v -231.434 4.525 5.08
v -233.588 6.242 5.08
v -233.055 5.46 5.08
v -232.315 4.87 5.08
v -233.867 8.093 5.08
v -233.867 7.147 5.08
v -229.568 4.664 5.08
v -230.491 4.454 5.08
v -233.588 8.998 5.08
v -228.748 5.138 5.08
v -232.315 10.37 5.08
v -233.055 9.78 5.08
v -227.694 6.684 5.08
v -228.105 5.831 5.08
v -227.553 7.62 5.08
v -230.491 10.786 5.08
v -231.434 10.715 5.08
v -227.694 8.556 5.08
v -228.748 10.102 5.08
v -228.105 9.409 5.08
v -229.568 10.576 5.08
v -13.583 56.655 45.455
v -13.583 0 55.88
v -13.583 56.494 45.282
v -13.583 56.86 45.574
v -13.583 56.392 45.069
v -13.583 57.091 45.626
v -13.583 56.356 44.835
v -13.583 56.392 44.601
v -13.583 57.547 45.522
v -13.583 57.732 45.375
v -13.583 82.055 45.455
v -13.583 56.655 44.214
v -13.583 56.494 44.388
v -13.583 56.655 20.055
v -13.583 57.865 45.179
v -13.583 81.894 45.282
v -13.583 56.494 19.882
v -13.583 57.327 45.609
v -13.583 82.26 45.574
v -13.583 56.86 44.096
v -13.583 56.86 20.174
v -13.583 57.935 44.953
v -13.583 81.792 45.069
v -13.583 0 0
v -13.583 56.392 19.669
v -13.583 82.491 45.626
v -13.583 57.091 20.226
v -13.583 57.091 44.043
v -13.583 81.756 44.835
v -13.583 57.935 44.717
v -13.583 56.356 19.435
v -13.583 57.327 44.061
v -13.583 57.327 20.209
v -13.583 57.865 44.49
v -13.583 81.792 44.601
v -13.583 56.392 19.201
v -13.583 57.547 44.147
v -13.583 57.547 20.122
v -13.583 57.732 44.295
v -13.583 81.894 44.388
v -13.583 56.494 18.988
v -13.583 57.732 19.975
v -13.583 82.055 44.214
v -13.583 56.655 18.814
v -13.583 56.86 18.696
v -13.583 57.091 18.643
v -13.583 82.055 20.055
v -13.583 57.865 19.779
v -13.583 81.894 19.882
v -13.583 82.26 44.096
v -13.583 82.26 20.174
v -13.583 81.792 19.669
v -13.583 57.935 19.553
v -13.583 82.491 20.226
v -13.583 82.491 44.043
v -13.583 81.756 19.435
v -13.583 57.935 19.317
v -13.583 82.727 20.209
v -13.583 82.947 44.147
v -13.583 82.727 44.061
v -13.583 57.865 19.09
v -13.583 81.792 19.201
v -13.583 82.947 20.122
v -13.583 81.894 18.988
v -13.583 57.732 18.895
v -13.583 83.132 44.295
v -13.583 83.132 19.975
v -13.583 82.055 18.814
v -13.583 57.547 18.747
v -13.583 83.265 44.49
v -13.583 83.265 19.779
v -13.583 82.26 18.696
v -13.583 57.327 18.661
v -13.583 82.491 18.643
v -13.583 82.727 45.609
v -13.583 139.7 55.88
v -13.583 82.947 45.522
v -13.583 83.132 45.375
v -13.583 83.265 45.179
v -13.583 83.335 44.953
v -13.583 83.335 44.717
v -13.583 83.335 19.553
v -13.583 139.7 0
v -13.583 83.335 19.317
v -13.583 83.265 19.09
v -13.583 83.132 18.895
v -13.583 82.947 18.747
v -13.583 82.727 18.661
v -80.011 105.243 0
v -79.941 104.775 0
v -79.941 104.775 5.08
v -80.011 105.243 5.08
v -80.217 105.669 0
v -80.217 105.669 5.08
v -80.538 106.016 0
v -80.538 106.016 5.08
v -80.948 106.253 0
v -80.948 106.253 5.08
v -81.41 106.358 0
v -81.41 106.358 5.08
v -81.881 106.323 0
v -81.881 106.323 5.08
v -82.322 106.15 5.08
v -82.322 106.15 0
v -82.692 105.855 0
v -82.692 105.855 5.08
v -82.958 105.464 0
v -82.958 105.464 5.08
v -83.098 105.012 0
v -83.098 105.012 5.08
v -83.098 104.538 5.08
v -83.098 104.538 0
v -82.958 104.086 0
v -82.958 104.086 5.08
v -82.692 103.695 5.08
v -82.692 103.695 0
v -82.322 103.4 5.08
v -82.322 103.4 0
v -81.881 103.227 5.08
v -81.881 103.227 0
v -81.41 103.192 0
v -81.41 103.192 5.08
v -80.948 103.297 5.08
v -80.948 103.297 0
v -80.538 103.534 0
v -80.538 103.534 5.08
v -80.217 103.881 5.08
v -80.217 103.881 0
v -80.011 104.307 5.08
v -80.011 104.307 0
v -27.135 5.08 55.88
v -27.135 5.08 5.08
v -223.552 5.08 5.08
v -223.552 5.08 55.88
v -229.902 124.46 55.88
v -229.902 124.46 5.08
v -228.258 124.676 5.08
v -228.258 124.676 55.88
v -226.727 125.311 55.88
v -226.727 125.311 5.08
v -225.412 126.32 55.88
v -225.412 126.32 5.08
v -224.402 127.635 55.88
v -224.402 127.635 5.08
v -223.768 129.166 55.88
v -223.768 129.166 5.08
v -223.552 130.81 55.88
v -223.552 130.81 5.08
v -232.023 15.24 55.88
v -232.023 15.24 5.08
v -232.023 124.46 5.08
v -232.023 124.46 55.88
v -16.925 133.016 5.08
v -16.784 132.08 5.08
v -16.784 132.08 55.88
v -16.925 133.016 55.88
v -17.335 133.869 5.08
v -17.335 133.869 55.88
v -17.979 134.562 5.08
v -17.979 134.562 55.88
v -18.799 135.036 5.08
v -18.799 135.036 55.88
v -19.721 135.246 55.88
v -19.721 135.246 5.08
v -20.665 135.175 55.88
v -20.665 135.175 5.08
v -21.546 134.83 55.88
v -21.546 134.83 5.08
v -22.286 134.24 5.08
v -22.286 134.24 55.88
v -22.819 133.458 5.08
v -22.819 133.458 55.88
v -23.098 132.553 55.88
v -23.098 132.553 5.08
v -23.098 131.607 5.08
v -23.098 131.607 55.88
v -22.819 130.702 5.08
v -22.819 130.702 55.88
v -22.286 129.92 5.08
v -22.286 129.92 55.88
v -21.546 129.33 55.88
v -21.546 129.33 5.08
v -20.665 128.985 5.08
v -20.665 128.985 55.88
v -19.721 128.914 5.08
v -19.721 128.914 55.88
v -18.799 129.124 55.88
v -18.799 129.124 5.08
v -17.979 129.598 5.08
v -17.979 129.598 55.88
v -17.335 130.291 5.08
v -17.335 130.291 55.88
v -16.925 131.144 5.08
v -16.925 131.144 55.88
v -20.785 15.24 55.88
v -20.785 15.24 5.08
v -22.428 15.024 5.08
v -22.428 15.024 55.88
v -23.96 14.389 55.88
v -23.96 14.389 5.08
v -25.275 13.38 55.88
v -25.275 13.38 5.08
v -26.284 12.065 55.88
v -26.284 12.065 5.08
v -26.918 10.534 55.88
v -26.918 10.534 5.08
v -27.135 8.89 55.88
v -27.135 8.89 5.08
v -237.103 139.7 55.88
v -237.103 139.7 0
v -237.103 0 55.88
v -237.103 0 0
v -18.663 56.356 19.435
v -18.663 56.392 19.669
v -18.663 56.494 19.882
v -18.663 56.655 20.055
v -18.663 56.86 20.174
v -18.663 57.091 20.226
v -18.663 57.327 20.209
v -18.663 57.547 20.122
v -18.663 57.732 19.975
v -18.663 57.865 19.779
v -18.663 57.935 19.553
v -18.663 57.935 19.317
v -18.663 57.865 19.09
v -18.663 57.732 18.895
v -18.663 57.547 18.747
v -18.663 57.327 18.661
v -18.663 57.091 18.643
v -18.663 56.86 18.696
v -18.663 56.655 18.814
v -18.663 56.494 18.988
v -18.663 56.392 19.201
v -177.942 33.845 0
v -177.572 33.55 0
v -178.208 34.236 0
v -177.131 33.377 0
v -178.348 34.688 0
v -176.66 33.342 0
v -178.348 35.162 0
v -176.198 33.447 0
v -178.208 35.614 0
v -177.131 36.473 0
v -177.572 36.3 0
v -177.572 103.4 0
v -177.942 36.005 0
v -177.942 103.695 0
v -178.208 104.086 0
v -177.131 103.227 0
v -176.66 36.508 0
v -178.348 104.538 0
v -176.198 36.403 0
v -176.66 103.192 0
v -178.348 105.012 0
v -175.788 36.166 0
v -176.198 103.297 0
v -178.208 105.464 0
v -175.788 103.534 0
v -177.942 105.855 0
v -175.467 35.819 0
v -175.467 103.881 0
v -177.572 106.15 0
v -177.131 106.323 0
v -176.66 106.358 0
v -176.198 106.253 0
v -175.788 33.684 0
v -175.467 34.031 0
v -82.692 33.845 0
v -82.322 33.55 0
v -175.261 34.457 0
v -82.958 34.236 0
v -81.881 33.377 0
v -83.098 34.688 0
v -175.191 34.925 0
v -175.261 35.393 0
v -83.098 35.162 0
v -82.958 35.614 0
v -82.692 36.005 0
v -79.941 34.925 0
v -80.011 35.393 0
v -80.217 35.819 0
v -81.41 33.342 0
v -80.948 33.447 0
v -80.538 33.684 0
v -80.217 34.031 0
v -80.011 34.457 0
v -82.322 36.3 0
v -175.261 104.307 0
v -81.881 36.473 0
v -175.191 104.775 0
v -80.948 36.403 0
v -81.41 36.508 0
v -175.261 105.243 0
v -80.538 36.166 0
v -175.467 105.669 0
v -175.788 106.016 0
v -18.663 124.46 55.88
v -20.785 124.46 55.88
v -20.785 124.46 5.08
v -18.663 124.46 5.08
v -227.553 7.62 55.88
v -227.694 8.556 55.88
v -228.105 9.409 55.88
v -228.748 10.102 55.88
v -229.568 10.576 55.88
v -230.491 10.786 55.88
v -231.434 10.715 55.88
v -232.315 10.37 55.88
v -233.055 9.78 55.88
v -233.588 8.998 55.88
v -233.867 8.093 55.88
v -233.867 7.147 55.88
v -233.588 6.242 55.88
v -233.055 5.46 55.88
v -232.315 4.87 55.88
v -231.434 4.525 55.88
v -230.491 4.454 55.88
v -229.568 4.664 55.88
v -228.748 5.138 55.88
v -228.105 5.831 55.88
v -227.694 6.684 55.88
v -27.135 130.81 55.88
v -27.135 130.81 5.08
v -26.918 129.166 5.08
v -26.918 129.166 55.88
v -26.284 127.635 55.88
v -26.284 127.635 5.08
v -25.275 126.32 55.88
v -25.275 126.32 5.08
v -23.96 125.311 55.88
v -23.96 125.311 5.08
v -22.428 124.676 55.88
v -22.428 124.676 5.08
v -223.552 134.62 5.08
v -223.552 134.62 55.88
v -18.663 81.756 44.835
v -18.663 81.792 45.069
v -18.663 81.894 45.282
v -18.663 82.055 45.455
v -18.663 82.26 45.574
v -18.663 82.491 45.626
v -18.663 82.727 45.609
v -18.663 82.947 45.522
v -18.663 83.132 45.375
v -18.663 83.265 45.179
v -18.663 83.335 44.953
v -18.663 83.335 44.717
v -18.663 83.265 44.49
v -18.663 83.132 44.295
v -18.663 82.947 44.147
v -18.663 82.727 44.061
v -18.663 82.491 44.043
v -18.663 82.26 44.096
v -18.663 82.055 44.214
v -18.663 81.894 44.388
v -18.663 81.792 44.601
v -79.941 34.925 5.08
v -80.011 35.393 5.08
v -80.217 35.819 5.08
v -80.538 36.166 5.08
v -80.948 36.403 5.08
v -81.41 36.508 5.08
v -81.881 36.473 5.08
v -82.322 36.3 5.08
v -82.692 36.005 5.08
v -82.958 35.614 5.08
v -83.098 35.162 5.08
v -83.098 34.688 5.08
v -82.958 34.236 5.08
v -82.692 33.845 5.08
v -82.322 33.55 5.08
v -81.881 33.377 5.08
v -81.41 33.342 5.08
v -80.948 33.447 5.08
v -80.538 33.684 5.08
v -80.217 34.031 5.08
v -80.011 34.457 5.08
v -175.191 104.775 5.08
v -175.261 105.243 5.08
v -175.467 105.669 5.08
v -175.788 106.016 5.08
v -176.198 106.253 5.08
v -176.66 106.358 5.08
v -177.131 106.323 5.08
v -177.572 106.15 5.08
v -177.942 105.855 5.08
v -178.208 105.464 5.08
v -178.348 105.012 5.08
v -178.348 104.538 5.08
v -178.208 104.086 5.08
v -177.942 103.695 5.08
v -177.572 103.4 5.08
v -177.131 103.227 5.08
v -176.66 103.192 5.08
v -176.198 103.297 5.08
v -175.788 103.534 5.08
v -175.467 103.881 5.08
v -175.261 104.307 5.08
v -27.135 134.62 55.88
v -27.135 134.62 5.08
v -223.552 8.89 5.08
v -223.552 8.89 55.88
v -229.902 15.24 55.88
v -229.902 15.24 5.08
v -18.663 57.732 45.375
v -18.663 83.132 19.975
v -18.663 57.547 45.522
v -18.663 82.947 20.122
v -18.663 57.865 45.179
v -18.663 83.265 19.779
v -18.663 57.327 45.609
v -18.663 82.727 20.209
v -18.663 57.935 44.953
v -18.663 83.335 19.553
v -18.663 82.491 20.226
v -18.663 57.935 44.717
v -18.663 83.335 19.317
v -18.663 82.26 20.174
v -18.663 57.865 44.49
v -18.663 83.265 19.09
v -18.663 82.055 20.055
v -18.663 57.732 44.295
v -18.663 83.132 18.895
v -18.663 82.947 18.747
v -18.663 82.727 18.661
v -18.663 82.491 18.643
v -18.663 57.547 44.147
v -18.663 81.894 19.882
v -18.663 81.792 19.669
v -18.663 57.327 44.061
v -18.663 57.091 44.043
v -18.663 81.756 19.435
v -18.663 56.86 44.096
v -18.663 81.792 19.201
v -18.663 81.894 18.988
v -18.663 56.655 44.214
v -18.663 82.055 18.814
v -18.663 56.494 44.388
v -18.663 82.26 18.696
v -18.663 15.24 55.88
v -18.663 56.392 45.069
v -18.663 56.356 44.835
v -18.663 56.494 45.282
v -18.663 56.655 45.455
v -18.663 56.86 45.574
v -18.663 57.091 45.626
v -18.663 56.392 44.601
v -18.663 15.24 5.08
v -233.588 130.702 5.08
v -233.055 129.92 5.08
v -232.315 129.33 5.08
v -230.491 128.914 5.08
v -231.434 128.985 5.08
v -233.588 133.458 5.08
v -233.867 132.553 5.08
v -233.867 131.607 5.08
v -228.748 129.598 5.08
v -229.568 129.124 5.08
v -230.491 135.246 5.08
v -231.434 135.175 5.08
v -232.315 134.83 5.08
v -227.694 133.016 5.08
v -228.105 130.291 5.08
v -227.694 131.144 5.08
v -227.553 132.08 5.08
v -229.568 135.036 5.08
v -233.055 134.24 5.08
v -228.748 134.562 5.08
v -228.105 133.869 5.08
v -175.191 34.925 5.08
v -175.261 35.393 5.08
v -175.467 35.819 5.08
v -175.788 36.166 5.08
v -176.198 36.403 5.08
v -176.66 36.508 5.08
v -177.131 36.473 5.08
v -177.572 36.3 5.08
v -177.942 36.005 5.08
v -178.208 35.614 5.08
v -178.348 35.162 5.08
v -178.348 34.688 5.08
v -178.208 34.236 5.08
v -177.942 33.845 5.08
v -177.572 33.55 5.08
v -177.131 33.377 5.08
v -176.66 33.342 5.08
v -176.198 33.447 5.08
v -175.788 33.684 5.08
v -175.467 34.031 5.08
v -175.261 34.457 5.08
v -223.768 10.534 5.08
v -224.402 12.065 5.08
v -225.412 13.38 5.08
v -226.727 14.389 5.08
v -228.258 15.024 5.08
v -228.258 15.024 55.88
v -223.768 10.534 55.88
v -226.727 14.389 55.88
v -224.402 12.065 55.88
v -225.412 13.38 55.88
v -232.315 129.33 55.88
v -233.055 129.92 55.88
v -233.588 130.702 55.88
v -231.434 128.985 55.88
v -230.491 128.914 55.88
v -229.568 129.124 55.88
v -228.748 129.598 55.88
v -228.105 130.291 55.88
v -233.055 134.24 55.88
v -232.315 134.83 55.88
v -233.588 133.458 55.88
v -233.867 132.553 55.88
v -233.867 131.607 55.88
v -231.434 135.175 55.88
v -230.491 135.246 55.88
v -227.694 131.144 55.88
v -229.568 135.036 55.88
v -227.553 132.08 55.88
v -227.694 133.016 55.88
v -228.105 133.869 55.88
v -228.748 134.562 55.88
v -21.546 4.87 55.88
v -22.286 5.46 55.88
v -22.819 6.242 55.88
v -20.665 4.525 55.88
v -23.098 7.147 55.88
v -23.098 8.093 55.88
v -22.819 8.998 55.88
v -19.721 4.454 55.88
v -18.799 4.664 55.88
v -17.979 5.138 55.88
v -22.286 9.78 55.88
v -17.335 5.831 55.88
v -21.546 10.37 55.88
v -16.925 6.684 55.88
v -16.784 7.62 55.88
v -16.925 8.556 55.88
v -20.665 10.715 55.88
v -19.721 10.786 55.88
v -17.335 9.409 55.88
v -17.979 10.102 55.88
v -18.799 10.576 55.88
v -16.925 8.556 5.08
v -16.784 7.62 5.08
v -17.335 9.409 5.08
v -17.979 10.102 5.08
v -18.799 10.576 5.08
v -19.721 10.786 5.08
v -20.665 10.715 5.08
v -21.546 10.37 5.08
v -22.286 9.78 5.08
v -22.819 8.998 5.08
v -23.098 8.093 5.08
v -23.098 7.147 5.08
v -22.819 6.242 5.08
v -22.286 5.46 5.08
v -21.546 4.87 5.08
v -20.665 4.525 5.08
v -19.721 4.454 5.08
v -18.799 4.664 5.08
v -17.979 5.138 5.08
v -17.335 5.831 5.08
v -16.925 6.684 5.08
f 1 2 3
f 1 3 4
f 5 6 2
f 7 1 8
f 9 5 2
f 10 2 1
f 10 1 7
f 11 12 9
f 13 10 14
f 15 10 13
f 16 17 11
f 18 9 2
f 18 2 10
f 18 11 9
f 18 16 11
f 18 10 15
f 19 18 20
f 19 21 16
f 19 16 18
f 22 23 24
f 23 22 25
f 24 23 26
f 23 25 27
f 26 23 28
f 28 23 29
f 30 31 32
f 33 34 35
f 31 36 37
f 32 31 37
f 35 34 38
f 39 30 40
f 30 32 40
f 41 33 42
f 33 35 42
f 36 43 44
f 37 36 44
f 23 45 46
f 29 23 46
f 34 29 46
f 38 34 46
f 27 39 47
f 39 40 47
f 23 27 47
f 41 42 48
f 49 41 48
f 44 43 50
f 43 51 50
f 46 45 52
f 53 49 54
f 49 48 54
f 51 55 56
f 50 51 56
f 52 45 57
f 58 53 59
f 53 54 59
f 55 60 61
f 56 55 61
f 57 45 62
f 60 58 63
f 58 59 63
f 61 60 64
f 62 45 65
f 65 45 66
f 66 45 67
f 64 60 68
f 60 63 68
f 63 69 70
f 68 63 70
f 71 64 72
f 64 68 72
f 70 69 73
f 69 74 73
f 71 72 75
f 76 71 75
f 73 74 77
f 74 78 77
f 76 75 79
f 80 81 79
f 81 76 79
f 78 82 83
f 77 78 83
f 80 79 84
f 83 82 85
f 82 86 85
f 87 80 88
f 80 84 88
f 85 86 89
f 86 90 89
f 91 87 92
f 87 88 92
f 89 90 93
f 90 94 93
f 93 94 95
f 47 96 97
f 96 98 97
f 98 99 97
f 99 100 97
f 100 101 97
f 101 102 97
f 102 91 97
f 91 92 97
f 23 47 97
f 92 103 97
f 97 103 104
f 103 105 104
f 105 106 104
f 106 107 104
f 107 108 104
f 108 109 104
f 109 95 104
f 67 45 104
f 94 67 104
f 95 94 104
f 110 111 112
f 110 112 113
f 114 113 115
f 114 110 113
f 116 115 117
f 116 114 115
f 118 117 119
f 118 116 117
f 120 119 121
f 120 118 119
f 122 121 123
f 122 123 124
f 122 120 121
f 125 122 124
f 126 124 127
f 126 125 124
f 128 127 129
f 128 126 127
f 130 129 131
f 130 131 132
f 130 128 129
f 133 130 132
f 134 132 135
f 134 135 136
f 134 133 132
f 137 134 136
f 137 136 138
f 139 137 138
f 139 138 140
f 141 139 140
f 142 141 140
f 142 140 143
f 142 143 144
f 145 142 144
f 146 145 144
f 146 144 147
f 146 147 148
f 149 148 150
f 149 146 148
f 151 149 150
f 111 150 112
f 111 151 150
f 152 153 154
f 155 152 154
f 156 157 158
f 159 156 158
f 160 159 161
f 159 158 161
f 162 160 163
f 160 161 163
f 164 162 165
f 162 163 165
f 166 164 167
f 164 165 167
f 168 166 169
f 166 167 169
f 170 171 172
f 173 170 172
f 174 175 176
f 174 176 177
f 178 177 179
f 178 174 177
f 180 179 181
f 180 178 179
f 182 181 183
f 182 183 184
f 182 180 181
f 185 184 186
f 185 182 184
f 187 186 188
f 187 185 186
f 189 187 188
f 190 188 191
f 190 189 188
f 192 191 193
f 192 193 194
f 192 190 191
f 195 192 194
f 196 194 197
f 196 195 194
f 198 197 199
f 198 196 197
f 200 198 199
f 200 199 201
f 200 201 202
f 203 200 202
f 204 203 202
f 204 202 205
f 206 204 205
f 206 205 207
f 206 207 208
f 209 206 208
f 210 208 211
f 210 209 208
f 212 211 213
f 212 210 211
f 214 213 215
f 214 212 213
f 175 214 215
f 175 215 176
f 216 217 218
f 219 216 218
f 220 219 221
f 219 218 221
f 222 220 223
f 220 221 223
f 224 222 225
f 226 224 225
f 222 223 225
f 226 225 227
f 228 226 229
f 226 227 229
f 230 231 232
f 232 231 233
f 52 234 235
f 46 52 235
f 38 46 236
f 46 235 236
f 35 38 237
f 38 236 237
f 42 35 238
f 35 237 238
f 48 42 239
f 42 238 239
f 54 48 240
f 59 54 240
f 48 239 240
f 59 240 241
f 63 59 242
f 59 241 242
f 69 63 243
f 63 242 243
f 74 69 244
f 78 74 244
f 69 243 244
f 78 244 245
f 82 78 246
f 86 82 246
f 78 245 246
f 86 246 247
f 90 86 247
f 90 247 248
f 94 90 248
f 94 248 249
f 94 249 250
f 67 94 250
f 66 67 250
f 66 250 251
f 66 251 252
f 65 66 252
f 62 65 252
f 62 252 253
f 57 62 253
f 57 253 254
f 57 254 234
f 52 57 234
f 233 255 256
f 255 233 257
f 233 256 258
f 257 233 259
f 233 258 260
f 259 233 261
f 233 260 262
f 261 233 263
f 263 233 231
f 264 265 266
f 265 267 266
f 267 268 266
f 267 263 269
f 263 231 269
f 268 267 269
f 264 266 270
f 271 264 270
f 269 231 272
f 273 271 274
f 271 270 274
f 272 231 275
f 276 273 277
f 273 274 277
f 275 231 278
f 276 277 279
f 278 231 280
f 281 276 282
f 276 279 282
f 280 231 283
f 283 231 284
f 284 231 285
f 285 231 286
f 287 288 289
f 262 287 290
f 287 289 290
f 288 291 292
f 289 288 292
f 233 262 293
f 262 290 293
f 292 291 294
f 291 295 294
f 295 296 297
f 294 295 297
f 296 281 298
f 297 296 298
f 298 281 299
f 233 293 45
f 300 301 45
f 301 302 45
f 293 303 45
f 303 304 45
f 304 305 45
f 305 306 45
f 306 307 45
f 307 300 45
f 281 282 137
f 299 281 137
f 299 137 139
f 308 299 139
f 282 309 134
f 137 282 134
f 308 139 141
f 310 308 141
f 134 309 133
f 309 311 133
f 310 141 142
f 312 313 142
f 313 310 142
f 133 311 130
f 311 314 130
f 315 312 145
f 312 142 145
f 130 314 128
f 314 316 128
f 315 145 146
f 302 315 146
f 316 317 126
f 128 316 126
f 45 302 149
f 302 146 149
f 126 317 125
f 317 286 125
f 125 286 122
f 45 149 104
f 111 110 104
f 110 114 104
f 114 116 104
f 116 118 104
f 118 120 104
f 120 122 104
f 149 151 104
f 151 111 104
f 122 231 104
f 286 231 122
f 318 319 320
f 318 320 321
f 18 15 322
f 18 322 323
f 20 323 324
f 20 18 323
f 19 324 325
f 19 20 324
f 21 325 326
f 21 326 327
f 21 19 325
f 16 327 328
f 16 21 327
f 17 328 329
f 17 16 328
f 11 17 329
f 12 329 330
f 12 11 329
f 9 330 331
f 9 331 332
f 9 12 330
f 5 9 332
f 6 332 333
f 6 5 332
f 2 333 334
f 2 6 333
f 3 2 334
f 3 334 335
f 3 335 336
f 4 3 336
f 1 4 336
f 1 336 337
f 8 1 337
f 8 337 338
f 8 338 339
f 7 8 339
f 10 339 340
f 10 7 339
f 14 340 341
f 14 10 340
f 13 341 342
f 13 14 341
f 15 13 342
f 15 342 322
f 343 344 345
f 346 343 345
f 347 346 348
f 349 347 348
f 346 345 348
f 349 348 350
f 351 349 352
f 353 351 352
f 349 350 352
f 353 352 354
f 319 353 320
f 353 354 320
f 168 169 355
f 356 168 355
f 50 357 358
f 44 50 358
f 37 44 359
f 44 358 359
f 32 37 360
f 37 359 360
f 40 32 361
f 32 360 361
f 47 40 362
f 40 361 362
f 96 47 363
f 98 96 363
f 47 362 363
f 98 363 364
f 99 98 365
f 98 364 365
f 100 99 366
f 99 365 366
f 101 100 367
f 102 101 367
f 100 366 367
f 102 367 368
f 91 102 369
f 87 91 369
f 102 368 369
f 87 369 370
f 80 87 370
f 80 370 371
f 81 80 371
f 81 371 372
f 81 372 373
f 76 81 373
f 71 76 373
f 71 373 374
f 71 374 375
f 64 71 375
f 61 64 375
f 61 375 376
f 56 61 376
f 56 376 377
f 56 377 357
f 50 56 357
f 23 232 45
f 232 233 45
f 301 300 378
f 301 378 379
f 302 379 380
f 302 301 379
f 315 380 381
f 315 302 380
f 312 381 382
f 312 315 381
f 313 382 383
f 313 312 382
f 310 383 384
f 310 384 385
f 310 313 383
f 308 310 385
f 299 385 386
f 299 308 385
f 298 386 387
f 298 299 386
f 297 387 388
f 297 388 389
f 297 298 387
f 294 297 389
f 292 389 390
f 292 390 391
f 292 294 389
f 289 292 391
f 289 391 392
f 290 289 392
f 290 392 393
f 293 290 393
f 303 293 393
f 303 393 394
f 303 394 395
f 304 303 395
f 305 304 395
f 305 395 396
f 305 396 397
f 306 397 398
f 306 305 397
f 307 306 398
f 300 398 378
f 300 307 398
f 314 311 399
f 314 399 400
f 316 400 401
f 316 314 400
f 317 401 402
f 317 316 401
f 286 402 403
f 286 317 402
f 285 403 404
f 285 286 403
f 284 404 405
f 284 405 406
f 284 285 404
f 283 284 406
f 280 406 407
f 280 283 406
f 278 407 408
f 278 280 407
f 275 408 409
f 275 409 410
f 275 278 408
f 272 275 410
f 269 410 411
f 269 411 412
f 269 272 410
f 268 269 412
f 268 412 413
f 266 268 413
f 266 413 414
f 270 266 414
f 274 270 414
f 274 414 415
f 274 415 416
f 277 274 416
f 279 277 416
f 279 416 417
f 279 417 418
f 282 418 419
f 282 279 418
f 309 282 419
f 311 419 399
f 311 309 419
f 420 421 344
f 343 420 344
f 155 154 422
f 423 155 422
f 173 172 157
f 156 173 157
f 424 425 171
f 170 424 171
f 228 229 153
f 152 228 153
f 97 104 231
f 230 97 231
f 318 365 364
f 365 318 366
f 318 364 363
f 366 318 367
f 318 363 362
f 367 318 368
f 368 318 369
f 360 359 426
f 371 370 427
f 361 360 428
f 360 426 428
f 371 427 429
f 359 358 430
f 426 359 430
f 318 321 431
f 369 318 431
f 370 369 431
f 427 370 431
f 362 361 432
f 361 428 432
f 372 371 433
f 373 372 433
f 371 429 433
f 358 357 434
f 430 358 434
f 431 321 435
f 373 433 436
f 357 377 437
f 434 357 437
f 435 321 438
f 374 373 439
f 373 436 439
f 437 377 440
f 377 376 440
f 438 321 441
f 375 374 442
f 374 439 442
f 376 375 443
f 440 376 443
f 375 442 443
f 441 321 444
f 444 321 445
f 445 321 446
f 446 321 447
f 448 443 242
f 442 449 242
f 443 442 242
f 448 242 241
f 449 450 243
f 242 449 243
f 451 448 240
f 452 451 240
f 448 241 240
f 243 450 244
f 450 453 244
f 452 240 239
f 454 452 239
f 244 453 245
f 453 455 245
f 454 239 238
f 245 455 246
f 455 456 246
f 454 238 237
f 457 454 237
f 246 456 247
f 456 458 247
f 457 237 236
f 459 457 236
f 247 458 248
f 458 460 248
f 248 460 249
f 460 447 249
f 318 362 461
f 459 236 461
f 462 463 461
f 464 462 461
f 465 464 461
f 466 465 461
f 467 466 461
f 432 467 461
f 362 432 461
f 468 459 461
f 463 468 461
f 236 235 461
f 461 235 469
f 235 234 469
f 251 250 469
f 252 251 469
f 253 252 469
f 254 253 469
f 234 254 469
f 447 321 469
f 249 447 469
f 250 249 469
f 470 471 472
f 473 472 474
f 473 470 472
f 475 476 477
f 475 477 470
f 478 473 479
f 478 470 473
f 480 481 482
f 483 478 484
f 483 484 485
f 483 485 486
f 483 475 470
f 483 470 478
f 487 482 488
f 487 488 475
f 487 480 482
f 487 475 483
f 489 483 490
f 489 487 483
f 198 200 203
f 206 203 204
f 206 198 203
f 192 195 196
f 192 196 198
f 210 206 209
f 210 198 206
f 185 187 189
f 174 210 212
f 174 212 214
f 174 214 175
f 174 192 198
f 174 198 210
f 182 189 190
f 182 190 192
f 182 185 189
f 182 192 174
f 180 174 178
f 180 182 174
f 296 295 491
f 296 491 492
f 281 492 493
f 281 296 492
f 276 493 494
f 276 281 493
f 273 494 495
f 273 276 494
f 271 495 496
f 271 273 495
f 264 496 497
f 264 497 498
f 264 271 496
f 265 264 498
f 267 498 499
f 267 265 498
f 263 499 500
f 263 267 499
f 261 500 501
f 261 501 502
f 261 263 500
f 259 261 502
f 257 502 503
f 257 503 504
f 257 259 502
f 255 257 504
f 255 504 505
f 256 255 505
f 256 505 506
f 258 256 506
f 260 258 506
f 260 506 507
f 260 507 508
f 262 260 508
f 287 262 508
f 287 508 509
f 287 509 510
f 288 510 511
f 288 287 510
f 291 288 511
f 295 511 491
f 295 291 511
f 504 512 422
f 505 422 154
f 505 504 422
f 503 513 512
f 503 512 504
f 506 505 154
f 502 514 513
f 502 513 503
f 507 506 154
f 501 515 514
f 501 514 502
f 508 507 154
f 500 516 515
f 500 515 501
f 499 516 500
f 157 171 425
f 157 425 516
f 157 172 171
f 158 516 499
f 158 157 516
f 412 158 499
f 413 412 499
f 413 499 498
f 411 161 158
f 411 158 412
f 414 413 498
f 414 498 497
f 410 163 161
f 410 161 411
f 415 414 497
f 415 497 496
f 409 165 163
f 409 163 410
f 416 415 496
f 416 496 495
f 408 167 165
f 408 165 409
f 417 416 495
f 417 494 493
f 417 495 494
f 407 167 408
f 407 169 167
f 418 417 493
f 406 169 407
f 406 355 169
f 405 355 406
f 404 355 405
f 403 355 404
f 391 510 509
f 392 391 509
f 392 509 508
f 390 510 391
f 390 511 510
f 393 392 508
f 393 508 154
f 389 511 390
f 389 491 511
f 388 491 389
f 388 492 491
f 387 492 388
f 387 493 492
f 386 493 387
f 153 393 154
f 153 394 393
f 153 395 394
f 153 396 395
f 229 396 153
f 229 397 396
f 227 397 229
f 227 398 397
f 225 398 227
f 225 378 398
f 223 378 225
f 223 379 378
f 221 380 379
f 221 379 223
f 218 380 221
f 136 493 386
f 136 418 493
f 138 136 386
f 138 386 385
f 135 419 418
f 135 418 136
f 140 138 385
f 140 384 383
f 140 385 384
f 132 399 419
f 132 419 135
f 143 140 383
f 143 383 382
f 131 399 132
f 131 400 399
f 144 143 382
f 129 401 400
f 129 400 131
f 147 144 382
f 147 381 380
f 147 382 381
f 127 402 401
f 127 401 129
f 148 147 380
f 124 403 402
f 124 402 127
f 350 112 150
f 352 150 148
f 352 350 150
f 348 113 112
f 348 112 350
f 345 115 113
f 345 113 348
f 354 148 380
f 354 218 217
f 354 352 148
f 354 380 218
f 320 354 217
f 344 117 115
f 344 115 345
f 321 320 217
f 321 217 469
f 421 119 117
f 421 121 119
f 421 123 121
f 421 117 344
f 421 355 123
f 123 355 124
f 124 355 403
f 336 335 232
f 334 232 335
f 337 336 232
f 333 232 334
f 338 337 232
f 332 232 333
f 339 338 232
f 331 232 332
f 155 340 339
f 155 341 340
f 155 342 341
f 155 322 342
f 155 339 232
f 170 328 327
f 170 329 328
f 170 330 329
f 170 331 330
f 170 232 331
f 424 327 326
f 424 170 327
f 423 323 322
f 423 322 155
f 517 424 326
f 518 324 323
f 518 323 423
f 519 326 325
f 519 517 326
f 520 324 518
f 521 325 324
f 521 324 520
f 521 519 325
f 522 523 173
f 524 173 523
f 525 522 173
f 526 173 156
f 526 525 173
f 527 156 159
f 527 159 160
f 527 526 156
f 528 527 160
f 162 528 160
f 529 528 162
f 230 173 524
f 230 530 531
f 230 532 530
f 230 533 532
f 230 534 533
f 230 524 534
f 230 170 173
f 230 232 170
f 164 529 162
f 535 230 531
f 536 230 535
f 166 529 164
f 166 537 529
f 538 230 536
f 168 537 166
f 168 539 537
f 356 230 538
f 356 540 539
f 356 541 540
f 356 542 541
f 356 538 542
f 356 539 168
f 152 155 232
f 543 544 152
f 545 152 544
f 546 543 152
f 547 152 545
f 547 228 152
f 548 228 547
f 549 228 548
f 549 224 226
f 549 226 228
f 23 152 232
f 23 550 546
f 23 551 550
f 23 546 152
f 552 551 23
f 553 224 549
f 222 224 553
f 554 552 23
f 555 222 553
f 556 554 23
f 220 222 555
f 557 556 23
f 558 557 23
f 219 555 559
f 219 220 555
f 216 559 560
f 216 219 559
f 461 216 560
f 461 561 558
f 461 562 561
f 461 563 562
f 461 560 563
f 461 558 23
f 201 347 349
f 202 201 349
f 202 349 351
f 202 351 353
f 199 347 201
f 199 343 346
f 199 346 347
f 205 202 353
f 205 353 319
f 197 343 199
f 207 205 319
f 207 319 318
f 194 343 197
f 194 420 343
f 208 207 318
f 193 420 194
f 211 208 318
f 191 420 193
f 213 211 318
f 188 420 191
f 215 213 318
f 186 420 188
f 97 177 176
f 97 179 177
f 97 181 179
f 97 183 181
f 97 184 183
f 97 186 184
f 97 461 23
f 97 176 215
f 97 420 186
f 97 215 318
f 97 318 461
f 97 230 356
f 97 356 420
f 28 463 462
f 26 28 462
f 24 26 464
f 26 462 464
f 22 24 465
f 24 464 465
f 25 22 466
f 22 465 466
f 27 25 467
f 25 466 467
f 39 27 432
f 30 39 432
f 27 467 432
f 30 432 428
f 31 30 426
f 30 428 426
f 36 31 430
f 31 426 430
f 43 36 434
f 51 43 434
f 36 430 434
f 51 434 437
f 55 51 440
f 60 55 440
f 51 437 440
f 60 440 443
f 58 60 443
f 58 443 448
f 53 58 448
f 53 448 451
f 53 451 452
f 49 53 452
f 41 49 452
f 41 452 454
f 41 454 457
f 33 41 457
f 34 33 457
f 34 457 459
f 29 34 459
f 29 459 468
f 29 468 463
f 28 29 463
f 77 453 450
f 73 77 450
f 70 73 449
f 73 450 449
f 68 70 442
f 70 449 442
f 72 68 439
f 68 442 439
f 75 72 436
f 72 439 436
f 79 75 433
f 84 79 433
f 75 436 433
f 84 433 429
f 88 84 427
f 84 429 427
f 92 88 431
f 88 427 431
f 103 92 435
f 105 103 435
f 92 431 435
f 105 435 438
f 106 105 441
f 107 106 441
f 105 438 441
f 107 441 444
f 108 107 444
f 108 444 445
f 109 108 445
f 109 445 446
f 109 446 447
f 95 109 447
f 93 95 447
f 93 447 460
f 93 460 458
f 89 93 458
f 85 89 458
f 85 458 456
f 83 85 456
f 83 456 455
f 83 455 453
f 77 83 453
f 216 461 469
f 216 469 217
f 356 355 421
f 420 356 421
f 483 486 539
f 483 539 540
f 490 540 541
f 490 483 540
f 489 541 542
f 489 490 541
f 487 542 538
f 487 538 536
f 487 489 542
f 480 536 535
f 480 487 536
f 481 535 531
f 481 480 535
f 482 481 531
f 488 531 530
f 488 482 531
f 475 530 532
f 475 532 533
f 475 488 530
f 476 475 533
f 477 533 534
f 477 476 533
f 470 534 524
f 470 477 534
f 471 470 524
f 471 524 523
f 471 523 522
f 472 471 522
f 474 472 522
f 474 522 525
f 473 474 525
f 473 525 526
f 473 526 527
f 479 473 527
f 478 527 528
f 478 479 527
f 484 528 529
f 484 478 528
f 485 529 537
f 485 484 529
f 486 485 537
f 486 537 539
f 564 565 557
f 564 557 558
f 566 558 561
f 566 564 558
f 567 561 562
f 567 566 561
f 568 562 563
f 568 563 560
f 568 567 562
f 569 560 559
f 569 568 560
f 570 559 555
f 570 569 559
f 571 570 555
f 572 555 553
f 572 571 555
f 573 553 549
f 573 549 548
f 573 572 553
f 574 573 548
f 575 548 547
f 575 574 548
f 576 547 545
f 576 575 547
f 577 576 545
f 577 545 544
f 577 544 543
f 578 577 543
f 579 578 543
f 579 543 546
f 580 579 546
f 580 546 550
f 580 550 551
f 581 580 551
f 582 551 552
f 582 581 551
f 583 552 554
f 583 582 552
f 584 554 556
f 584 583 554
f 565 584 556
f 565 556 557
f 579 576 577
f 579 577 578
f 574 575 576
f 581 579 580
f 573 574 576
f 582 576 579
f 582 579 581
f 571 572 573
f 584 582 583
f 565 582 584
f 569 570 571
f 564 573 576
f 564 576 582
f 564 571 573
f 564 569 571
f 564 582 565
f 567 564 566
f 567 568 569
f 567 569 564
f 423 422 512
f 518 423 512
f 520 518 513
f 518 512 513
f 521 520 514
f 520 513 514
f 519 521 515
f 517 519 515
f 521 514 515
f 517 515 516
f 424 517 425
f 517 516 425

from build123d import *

# Parameters (mm, degrees)
F0_W     = 223.52
F0_H     = 139.7
F0_R     = 1.5875
F1_DEPTH = 5.08
F2_R     = 3.175
F3_DEPTH = 50.8
F4_R     = 0.79375
F5_DEPTH = 51.562


with BuildPart() as f1:
    # F0 (on Top) → F1 (new body)
    with BuildSketch(Plane.XY):
        with Locations((-125.343207, 69.85)):
            Rectangle(F0_W, F0_H)
        with Locations((-176.778207, 34.925)):
            Circle(F0_R, mode=Mode.SUBTRACT)
        with Locations((-81.528207, 34.925)):
            Circle(F0_R, mode=Mode.SUBTRACT)
        with Locations((-176.778207, 104.775)):
            Circle(F0_R, mode=Mode.SUBTRACT)
        with Locations((-81.528207, 104.775)):
            Circle(F0_R, mode=Mode.SUBTRACT)
    extrude(amount=F1_DEPTH)

    # F2 (on face) → F3 (join)
    with BuildSketch(Plane.XY.offset(5.08)):
        Polygon((-229.483207, 139.7), (-237.103207, 139.7), (-237.103207, 132.08), (-237.103207, 124.46), (-237.103207, 15.24), (-237.103207, 7.62), (-237.103207, 0), (-229.483207, 0), (-221.863207, 0), (-125.343207, 0), (-28.823207, 0), (-21.203207, 0), (-13.583207, 0), (-13.583207, 7.62), (-13.583207, 15.24), (-13.583207, 124.46), (-13.583207, 132.08), (-13.583207, 139.7), (-21.203207, 139.7), (-28.823207, 139.7), (-125.343207, 139.7), (-221.863207, 139.7), align=None)
        with Locations((-230.727843, 7.62)):
            Circle(F2_R, mode=Mode.SUBTRACT)
        with Locations((-19.958571, 7.62)):
            Circle(F2_R, mode=Mode.SUBTRACT)
        with Locations((-230.727843, 132.08)):
            Circle(F2_R, mode=Mode.SUBTRACT)
        with BuildLine():
            Line((-232.023207, 15.24), (-232.023207, 124.46))
            Line((-232.023207, 124.46), (-229.901726, 124.46))
            ThreePointArc((-229.901726, 124.46), (-225.411598, 126.319872), (-223.551726, 130.81))
            Line((-223.551726, 130.81), (-223.551726, 134.62))
            Line((-223.551726, 134.62), (-125.343207, 134.62))
            Line((-125.343207, 134.62), (-27.134688, 134.62))
            Line((-27.134688, 134.62), (-27.134688, 130.81))
            ThreePointArc((-27.134688, 130.81), (-25.274816, 126.319872), (-20.784688, 124.46))
            Line((-20.784688, 124.46), (-18.663207, 124.46))
            Line((-18.663207, 124.46), (-18.663207, 15.24))
            Line((-18.663207, 15.24), (-20.784688, 15.24))
            ThreePointArc((-20.784688, 15.24), (-25.274816, 13.380128), (-27.134688, 8.89))
            Line((-27.134688, 8.89), (-27.134688, 5.08))
            Line((-27.134688, 5.08), (-125.343207, 5.08))
            Line((-125.343207, 5.08), (-223.551726, 5.08))
            Line((-223.551726, 5.08), (-223.551726, 8.89))
            ThreePointArc((-223.551726, 8.89), (-225.411598, 13.380128), (-229.901726, 15.24))
            Line((-229.901726, 15.24), (-232.023207, 15.24))
        make_face(mode=Mode.SUBTRACT)
        with Locations((-19.958571, 132.08)):
            Circle(F2_R, mode=Mode.SUBTRACT)
    extrude(amount=F3_DEPTH)

    # F4 (on face) → F5 (cut)
    with BuildSketch(Plane(origin=(-18.663207, 0, 0), x_dir=(0, -1, 0), z_dir=(-1, 0, 0))):
        with Locations((-82.55, 44.834881)):
            Circle(F4_R)
        with Locations((-57.15, 44.834881)):
            Circle(F4_R)
        with Locations((-82.55, 19.434881)):
            Circle(F4_R)
        with Locations((-57.15, 19.434881)):
            Circle(F4_R)
    extrude(amount=-F5_DEPTH, mode=Mode.SUBTRACT)


solid = f1.part
